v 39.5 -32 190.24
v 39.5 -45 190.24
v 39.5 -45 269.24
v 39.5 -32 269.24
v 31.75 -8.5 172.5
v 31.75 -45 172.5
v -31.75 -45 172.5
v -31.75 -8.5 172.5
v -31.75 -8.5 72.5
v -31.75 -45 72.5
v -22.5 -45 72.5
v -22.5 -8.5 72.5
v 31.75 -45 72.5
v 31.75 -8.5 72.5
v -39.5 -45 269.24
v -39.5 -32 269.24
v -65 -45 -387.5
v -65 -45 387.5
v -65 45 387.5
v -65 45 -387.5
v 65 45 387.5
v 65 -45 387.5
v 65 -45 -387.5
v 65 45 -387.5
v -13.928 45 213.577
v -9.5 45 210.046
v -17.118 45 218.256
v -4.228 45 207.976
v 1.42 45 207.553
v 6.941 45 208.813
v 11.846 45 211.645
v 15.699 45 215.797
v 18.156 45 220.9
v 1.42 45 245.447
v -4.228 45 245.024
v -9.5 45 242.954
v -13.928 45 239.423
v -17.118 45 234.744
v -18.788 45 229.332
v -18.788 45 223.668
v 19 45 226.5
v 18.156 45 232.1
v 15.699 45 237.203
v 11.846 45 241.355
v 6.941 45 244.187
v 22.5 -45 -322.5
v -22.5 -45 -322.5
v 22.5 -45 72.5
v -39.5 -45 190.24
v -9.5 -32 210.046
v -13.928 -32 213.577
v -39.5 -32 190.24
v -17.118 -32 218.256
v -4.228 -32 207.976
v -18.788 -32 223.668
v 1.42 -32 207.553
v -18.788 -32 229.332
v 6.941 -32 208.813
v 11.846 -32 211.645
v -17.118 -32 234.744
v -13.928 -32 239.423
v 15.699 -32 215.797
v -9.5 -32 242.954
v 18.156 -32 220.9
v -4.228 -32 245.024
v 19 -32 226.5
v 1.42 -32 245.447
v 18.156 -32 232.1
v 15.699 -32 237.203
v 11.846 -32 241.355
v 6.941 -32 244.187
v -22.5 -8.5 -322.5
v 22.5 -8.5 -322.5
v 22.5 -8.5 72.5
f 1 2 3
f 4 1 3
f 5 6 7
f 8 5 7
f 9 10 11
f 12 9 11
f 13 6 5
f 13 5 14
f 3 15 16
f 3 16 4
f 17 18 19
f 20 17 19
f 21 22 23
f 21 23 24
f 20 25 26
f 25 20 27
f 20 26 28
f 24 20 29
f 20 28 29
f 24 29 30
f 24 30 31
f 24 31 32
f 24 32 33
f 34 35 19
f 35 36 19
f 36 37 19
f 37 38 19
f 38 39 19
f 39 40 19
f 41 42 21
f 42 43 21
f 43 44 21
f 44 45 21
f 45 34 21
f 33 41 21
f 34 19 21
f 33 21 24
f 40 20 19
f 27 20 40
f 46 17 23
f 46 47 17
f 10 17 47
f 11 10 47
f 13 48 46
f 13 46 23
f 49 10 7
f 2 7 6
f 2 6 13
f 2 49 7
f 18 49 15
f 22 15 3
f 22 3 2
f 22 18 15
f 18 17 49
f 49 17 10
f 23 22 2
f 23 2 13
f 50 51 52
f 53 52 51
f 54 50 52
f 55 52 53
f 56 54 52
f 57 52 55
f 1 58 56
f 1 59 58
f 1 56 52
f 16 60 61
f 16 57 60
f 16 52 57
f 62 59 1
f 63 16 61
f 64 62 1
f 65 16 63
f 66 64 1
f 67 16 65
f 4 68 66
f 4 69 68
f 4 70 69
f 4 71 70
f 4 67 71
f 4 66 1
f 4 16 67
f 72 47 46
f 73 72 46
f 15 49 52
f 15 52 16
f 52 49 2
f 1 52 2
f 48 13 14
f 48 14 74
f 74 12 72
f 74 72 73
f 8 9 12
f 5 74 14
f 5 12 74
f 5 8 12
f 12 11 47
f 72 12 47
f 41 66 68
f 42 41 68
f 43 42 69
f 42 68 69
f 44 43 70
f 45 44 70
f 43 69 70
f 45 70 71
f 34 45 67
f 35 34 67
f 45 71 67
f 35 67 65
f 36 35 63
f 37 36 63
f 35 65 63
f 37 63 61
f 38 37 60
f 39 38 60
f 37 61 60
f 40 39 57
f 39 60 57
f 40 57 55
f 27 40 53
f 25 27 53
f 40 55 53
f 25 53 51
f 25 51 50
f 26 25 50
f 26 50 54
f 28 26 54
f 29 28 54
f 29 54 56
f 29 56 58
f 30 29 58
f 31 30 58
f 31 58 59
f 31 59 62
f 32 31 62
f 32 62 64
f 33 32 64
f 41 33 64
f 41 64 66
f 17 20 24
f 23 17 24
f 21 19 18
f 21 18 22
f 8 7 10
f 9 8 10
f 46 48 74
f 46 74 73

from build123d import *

# Parameters (mm, degrees)
SKETCH_W        = 130
SKETCH_H        = 90
PAD_DEPTH       = 387.5
POCKET_DEPTH    = 36.5
SKETCH002_R     = 19
POCKET001_DEPTH = 90.001
SKETCH003_W     = 79
SKETCH003_H     = 79
POCKET002_DEPTH = 13


with BuildPart() as part:
    # Sketch → Pad (new body, symmetric)
    with BuildSketch(Plane.XY):
        Rectangle(SKETCH_W, SKETCH_H)
    extrude(amount=PAD_DEPTH, both=True)

    # Sketch001 → Pocket (cut)
    with BuildSketch(Plane.XZ.offset(45)):
        Polygon((0, 172.5), (-31.75, 172.5), (-31.75, 72.5), (-22.5, 72.5), (-22.5, -322.5), (0, -322.5), align=None)
    pocket = extrude(amount=-POCKET_DEPTH, mode=Mode.SUBTRACT)

    # Mirrored: Pocket across Sketch001 V_Axis
    add(pocket.mirror(Plane(origin=(0, -45, 0), x_dir=(0, -1, 0), z_dir=(1, 0, 0))), mode=Mode.SUBTRACT)

    # Sketch002 → Pocket001 (cut, through all)
    with BuildSketch(Plane.XZ.offset(45)):
        with Locations((0, 226.5)):
            Circle(SKETCH002_R)
    extrude(amount=-POCKET001_DEPTH, mode=Mode.SUBTRACT)

    # Sketch003 → Pocket002 (cut)
    with BuildSketch(Plane.XZ.offset(45)):
        with Locations((0, 229.74)):
            Rectangle(SKETCH003_W, SKETCH003_H)
    extrude(amount=-POCKET002_DEPTH, mode=Mode.SUBTRACT)


solid = part.part
